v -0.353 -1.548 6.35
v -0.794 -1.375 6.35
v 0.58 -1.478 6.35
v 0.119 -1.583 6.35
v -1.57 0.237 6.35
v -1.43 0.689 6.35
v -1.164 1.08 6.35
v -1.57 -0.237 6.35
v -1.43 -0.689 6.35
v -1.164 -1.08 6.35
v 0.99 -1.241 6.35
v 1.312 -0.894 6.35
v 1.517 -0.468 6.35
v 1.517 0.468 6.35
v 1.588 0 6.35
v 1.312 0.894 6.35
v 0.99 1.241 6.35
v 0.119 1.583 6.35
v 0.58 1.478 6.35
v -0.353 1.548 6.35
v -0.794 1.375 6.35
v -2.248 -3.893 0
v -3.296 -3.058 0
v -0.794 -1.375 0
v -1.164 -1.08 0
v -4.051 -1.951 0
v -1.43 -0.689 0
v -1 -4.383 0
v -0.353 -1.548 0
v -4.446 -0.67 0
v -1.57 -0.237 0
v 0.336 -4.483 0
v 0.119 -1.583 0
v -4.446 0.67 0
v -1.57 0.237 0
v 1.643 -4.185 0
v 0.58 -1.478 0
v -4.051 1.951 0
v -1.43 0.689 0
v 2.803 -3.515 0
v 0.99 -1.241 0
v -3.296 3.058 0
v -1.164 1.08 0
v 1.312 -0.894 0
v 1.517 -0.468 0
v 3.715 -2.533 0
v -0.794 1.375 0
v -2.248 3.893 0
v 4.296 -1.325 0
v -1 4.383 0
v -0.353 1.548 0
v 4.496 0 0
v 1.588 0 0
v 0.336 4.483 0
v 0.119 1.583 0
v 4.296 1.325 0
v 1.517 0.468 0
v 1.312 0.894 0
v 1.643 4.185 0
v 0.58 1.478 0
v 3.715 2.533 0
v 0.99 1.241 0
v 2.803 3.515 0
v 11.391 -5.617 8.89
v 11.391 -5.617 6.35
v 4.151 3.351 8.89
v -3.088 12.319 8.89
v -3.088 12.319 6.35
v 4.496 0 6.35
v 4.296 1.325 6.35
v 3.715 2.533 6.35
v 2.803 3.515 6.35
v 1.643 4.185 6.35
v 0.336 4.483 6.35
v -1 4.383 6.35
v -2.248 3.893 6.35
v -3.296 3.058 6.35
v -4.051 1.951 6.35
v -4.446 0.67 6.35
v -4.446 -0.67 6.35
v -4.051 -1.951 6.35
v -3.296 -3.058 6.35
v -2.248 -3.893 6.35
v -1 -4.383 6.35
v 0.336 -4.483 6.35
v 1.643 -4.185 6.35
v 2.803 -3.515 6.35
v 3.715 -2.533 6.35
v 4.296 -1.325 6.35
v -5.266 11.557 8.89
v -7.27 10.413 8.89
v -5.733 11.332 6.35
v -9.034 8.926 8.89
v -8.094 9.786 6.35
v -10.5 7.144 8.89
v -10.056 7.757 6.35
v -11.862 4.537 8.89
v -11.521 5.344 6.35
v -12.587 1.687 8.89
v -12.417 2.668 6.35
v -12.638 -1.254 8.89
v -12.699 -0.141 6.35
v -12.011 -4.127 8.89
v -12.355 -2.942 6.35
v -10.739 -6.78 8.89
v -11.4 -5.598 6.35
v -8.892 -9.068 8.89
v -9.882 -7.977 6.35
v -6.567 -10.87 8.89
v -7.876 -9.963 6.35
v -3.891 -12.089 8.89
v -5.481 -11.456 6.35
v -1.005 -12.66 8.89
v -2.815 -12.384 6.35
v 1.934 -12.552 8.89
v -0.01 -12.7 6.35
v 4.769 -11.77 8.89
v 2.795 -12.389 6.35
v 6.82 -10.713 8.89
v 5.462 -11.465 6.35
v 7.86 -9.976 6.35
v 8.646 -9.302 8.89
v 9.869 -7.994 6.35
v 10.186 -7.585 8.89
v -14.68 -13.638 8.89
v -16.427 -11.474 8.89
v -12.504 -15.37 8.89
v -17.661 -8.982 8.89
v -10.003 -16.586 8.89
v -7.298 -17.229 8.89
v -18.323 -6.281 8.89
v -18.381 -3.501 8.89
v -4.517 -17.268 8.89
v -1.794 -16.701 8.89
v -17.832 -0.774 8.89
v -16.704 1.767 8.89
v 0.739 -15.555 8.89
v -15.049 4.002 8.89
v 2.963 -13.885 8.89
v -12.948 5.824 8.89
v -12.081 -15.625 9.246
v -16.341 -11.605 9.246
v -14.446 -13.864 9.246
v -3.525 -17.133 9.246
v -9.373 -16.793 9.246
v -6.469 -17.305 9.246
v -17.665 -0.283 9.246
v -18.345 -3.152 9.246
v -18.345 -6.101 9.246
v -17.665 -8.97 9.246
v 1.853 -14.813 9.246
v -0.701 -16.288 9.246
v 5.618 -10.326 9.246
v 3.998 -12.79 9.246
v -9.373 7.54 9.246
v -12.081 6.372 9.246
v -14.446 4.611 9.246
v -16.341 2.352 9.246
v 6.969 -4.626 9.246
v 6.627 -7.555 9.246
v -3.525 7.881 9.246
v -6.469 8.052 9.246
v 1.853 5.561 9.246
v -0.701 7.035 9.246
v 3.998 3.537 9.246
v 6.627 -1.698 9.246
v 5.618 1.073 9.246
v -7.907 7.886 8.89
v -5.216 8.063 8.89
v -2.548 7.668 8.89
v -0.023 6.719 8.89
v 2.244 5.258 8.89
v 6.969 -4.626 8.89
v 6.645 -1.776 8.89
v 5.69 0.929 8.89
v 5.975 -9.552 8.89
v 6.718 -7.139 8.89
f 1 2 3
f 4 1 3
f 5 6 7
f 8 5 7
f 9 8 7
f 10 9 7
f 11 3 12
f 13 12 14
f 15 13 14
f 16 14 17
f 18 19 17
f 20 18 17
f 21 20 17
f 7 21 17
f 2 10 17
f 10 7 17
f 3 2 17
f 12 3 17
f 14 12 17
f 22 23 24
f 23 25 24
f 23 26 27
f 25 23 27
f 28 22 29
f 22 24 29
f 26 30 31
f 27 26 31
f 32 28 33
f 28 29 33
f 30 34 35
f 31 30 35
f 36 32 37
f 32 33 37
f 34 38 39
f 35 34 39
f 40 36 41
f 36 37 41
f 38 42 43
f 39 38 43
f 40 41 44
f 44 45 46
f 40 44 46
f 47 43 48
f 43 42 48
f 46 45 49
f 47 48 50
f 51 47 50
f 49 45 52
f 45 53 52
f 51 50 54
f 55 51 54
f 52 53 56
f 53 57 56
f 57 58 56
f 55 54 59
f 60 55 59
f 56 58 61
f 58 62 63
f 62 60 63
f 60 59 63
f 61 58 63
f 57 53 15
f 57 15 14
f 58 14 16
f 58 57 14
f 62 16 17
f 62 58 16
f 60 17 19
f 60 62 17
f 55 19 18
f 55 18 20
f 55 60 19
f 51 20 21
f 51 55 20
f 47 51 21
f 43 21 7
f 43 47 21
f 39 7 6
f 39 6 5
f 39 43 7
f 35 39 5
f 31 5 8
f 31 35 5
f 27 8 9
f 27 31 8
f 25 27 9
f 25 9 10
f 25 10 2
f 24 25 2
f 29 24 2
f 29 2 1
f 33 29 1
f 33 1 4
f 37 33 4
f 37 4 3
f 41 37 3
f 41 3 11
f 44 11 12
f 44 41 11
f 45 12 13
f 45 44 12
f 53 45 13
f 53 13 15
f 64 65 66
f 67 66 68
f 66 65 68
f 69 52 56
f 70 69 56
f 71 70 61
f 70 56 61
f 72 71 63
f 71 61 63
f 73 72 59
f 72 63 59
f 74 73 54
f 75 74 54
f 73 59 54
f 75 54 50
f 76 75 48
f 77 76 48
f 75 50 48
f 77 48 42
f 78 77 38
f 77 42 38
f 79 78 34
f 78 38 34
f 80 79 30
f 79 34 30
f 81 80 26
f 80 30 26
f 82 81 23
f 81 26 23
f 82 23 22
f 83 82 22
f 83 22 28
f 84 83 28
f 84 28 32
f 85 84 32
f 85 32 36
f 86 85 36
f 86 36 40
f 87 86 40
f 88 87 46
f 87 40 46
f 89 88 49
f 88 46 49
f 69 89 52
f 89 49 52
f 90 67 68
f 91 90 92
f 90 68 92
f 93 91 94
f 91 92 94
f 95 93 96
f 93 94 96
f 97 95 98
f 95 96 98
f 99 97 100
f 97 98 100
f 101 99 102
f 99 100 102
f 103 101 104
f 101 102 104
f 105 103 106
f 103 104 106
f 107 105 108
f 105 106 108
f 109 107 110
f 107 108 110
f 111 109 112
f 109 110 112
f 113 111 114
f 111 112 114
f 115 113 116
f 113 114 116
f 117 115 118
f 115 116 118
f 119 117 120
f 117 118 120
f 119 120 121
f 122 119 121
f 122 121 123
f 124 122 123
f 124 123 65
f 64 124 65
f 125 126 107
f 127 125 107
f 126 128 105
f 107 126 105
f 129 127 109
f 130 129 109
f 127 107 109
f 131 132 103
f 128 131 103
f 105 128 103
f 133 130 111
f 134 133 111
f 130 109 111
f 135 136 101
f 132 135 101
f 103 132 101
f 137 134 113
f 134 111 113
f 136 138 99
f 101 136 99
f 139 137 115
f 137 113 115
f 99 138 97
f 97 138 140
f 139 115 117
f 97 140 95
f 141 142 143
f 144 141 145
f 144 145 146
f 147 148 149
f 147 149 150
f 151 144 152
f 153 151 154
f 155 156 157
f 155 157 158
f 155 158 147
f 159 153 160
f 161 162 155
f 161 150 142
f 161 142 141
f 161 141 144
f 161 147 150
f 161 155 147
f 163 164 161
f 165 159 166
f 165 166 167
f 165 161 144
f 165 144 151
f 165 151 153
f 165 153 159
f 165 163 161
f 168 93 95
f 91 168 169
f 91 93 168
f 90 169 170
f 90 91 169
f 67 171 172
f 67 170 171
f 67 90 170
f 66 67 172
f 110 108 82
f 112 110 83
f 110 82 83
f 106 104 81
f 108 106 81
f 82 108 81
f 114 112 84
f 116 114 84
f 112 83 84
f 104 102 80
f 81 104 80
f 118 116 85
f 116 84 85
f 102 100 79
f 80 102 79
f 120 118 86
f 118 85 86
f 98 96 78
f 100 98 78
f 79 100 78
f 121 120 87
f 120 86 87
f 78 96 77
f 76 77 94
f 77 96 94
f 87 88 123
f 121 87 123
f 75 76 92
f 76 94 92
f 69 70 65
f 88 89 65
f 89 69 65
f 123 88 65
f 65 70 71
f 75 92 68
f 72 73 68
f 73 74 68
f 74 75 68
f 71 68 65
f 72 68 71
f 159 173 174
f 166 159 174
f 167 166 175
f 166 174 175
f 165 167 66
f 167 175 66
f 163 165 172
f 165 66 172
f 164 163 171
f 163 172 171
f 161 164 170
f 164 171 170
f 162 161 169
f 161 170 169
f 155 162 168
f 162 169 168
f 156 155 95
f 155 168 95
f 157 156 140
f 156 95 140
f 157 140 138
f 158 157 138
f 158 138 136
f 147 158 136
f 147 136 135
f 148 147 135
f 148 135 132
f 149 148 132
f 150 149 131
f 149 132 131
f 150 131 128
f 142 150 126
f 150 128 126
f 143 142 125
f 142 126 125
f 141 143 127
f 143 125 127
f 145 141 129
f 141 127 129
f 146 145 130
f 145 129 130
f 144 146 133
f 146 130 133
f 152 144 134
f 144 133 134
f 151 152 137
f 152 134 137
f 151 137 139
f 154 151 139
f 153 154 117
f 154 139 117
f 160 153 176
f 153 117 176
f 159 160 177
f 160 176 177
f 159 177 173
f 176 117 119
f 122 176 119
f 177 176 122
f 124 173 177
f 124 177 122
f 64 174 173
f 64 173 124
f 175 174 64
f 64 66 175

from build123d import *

# Parameters (mm, degrees)
F0_R     = 4.4958
F0_R_2   = 1.5875
F1_DEPTH = 6.35
F2_R     = 12.7
F3_DEPTH = 2.54
F5_DEPTH = 2.541
F6_R     = 12.7
F7_DEPTH = 0.3556


with BuildPart() as f1:
    # F0 (on Top) → F1 (new body)
    with BuildSketch(Plane.XY):
        Circle(F0_R)
        Circle(F0_R_2, mode=Mode.SUBTRACT)
    extrude(amount=F1_DEPTH)

    # F2 (on face) → F3 (join)
    with BuildSketch(Plane.XY.offset(6.35)):
        Circle(F2_R)
    extrude(amount=F3_DEPTH)

    # F4 (on face) → F5 (cut, through all)
    with BuildSketch(Plane(origin=(0, 0, 6.35), x_dir=(1, 0, 0), z_dir=(0, 0, -1))):
        Polygon((21.399127, -20.925693), (19.316025, 15.433881), (-10.036758, -20.925693), align=None)
    extrude(amount=-F5_DEPTH, mode=Mode.SUBTRACT)

    # F6 (on face) → F7 (join)
    with BuildSketch(Plane.XY.offset(8.89)):
        with Locations((-5.730732, -4.626373)):
            Circle(F6_R)
    extrude(amount=F7_DEPTH)


solid = f1.part
